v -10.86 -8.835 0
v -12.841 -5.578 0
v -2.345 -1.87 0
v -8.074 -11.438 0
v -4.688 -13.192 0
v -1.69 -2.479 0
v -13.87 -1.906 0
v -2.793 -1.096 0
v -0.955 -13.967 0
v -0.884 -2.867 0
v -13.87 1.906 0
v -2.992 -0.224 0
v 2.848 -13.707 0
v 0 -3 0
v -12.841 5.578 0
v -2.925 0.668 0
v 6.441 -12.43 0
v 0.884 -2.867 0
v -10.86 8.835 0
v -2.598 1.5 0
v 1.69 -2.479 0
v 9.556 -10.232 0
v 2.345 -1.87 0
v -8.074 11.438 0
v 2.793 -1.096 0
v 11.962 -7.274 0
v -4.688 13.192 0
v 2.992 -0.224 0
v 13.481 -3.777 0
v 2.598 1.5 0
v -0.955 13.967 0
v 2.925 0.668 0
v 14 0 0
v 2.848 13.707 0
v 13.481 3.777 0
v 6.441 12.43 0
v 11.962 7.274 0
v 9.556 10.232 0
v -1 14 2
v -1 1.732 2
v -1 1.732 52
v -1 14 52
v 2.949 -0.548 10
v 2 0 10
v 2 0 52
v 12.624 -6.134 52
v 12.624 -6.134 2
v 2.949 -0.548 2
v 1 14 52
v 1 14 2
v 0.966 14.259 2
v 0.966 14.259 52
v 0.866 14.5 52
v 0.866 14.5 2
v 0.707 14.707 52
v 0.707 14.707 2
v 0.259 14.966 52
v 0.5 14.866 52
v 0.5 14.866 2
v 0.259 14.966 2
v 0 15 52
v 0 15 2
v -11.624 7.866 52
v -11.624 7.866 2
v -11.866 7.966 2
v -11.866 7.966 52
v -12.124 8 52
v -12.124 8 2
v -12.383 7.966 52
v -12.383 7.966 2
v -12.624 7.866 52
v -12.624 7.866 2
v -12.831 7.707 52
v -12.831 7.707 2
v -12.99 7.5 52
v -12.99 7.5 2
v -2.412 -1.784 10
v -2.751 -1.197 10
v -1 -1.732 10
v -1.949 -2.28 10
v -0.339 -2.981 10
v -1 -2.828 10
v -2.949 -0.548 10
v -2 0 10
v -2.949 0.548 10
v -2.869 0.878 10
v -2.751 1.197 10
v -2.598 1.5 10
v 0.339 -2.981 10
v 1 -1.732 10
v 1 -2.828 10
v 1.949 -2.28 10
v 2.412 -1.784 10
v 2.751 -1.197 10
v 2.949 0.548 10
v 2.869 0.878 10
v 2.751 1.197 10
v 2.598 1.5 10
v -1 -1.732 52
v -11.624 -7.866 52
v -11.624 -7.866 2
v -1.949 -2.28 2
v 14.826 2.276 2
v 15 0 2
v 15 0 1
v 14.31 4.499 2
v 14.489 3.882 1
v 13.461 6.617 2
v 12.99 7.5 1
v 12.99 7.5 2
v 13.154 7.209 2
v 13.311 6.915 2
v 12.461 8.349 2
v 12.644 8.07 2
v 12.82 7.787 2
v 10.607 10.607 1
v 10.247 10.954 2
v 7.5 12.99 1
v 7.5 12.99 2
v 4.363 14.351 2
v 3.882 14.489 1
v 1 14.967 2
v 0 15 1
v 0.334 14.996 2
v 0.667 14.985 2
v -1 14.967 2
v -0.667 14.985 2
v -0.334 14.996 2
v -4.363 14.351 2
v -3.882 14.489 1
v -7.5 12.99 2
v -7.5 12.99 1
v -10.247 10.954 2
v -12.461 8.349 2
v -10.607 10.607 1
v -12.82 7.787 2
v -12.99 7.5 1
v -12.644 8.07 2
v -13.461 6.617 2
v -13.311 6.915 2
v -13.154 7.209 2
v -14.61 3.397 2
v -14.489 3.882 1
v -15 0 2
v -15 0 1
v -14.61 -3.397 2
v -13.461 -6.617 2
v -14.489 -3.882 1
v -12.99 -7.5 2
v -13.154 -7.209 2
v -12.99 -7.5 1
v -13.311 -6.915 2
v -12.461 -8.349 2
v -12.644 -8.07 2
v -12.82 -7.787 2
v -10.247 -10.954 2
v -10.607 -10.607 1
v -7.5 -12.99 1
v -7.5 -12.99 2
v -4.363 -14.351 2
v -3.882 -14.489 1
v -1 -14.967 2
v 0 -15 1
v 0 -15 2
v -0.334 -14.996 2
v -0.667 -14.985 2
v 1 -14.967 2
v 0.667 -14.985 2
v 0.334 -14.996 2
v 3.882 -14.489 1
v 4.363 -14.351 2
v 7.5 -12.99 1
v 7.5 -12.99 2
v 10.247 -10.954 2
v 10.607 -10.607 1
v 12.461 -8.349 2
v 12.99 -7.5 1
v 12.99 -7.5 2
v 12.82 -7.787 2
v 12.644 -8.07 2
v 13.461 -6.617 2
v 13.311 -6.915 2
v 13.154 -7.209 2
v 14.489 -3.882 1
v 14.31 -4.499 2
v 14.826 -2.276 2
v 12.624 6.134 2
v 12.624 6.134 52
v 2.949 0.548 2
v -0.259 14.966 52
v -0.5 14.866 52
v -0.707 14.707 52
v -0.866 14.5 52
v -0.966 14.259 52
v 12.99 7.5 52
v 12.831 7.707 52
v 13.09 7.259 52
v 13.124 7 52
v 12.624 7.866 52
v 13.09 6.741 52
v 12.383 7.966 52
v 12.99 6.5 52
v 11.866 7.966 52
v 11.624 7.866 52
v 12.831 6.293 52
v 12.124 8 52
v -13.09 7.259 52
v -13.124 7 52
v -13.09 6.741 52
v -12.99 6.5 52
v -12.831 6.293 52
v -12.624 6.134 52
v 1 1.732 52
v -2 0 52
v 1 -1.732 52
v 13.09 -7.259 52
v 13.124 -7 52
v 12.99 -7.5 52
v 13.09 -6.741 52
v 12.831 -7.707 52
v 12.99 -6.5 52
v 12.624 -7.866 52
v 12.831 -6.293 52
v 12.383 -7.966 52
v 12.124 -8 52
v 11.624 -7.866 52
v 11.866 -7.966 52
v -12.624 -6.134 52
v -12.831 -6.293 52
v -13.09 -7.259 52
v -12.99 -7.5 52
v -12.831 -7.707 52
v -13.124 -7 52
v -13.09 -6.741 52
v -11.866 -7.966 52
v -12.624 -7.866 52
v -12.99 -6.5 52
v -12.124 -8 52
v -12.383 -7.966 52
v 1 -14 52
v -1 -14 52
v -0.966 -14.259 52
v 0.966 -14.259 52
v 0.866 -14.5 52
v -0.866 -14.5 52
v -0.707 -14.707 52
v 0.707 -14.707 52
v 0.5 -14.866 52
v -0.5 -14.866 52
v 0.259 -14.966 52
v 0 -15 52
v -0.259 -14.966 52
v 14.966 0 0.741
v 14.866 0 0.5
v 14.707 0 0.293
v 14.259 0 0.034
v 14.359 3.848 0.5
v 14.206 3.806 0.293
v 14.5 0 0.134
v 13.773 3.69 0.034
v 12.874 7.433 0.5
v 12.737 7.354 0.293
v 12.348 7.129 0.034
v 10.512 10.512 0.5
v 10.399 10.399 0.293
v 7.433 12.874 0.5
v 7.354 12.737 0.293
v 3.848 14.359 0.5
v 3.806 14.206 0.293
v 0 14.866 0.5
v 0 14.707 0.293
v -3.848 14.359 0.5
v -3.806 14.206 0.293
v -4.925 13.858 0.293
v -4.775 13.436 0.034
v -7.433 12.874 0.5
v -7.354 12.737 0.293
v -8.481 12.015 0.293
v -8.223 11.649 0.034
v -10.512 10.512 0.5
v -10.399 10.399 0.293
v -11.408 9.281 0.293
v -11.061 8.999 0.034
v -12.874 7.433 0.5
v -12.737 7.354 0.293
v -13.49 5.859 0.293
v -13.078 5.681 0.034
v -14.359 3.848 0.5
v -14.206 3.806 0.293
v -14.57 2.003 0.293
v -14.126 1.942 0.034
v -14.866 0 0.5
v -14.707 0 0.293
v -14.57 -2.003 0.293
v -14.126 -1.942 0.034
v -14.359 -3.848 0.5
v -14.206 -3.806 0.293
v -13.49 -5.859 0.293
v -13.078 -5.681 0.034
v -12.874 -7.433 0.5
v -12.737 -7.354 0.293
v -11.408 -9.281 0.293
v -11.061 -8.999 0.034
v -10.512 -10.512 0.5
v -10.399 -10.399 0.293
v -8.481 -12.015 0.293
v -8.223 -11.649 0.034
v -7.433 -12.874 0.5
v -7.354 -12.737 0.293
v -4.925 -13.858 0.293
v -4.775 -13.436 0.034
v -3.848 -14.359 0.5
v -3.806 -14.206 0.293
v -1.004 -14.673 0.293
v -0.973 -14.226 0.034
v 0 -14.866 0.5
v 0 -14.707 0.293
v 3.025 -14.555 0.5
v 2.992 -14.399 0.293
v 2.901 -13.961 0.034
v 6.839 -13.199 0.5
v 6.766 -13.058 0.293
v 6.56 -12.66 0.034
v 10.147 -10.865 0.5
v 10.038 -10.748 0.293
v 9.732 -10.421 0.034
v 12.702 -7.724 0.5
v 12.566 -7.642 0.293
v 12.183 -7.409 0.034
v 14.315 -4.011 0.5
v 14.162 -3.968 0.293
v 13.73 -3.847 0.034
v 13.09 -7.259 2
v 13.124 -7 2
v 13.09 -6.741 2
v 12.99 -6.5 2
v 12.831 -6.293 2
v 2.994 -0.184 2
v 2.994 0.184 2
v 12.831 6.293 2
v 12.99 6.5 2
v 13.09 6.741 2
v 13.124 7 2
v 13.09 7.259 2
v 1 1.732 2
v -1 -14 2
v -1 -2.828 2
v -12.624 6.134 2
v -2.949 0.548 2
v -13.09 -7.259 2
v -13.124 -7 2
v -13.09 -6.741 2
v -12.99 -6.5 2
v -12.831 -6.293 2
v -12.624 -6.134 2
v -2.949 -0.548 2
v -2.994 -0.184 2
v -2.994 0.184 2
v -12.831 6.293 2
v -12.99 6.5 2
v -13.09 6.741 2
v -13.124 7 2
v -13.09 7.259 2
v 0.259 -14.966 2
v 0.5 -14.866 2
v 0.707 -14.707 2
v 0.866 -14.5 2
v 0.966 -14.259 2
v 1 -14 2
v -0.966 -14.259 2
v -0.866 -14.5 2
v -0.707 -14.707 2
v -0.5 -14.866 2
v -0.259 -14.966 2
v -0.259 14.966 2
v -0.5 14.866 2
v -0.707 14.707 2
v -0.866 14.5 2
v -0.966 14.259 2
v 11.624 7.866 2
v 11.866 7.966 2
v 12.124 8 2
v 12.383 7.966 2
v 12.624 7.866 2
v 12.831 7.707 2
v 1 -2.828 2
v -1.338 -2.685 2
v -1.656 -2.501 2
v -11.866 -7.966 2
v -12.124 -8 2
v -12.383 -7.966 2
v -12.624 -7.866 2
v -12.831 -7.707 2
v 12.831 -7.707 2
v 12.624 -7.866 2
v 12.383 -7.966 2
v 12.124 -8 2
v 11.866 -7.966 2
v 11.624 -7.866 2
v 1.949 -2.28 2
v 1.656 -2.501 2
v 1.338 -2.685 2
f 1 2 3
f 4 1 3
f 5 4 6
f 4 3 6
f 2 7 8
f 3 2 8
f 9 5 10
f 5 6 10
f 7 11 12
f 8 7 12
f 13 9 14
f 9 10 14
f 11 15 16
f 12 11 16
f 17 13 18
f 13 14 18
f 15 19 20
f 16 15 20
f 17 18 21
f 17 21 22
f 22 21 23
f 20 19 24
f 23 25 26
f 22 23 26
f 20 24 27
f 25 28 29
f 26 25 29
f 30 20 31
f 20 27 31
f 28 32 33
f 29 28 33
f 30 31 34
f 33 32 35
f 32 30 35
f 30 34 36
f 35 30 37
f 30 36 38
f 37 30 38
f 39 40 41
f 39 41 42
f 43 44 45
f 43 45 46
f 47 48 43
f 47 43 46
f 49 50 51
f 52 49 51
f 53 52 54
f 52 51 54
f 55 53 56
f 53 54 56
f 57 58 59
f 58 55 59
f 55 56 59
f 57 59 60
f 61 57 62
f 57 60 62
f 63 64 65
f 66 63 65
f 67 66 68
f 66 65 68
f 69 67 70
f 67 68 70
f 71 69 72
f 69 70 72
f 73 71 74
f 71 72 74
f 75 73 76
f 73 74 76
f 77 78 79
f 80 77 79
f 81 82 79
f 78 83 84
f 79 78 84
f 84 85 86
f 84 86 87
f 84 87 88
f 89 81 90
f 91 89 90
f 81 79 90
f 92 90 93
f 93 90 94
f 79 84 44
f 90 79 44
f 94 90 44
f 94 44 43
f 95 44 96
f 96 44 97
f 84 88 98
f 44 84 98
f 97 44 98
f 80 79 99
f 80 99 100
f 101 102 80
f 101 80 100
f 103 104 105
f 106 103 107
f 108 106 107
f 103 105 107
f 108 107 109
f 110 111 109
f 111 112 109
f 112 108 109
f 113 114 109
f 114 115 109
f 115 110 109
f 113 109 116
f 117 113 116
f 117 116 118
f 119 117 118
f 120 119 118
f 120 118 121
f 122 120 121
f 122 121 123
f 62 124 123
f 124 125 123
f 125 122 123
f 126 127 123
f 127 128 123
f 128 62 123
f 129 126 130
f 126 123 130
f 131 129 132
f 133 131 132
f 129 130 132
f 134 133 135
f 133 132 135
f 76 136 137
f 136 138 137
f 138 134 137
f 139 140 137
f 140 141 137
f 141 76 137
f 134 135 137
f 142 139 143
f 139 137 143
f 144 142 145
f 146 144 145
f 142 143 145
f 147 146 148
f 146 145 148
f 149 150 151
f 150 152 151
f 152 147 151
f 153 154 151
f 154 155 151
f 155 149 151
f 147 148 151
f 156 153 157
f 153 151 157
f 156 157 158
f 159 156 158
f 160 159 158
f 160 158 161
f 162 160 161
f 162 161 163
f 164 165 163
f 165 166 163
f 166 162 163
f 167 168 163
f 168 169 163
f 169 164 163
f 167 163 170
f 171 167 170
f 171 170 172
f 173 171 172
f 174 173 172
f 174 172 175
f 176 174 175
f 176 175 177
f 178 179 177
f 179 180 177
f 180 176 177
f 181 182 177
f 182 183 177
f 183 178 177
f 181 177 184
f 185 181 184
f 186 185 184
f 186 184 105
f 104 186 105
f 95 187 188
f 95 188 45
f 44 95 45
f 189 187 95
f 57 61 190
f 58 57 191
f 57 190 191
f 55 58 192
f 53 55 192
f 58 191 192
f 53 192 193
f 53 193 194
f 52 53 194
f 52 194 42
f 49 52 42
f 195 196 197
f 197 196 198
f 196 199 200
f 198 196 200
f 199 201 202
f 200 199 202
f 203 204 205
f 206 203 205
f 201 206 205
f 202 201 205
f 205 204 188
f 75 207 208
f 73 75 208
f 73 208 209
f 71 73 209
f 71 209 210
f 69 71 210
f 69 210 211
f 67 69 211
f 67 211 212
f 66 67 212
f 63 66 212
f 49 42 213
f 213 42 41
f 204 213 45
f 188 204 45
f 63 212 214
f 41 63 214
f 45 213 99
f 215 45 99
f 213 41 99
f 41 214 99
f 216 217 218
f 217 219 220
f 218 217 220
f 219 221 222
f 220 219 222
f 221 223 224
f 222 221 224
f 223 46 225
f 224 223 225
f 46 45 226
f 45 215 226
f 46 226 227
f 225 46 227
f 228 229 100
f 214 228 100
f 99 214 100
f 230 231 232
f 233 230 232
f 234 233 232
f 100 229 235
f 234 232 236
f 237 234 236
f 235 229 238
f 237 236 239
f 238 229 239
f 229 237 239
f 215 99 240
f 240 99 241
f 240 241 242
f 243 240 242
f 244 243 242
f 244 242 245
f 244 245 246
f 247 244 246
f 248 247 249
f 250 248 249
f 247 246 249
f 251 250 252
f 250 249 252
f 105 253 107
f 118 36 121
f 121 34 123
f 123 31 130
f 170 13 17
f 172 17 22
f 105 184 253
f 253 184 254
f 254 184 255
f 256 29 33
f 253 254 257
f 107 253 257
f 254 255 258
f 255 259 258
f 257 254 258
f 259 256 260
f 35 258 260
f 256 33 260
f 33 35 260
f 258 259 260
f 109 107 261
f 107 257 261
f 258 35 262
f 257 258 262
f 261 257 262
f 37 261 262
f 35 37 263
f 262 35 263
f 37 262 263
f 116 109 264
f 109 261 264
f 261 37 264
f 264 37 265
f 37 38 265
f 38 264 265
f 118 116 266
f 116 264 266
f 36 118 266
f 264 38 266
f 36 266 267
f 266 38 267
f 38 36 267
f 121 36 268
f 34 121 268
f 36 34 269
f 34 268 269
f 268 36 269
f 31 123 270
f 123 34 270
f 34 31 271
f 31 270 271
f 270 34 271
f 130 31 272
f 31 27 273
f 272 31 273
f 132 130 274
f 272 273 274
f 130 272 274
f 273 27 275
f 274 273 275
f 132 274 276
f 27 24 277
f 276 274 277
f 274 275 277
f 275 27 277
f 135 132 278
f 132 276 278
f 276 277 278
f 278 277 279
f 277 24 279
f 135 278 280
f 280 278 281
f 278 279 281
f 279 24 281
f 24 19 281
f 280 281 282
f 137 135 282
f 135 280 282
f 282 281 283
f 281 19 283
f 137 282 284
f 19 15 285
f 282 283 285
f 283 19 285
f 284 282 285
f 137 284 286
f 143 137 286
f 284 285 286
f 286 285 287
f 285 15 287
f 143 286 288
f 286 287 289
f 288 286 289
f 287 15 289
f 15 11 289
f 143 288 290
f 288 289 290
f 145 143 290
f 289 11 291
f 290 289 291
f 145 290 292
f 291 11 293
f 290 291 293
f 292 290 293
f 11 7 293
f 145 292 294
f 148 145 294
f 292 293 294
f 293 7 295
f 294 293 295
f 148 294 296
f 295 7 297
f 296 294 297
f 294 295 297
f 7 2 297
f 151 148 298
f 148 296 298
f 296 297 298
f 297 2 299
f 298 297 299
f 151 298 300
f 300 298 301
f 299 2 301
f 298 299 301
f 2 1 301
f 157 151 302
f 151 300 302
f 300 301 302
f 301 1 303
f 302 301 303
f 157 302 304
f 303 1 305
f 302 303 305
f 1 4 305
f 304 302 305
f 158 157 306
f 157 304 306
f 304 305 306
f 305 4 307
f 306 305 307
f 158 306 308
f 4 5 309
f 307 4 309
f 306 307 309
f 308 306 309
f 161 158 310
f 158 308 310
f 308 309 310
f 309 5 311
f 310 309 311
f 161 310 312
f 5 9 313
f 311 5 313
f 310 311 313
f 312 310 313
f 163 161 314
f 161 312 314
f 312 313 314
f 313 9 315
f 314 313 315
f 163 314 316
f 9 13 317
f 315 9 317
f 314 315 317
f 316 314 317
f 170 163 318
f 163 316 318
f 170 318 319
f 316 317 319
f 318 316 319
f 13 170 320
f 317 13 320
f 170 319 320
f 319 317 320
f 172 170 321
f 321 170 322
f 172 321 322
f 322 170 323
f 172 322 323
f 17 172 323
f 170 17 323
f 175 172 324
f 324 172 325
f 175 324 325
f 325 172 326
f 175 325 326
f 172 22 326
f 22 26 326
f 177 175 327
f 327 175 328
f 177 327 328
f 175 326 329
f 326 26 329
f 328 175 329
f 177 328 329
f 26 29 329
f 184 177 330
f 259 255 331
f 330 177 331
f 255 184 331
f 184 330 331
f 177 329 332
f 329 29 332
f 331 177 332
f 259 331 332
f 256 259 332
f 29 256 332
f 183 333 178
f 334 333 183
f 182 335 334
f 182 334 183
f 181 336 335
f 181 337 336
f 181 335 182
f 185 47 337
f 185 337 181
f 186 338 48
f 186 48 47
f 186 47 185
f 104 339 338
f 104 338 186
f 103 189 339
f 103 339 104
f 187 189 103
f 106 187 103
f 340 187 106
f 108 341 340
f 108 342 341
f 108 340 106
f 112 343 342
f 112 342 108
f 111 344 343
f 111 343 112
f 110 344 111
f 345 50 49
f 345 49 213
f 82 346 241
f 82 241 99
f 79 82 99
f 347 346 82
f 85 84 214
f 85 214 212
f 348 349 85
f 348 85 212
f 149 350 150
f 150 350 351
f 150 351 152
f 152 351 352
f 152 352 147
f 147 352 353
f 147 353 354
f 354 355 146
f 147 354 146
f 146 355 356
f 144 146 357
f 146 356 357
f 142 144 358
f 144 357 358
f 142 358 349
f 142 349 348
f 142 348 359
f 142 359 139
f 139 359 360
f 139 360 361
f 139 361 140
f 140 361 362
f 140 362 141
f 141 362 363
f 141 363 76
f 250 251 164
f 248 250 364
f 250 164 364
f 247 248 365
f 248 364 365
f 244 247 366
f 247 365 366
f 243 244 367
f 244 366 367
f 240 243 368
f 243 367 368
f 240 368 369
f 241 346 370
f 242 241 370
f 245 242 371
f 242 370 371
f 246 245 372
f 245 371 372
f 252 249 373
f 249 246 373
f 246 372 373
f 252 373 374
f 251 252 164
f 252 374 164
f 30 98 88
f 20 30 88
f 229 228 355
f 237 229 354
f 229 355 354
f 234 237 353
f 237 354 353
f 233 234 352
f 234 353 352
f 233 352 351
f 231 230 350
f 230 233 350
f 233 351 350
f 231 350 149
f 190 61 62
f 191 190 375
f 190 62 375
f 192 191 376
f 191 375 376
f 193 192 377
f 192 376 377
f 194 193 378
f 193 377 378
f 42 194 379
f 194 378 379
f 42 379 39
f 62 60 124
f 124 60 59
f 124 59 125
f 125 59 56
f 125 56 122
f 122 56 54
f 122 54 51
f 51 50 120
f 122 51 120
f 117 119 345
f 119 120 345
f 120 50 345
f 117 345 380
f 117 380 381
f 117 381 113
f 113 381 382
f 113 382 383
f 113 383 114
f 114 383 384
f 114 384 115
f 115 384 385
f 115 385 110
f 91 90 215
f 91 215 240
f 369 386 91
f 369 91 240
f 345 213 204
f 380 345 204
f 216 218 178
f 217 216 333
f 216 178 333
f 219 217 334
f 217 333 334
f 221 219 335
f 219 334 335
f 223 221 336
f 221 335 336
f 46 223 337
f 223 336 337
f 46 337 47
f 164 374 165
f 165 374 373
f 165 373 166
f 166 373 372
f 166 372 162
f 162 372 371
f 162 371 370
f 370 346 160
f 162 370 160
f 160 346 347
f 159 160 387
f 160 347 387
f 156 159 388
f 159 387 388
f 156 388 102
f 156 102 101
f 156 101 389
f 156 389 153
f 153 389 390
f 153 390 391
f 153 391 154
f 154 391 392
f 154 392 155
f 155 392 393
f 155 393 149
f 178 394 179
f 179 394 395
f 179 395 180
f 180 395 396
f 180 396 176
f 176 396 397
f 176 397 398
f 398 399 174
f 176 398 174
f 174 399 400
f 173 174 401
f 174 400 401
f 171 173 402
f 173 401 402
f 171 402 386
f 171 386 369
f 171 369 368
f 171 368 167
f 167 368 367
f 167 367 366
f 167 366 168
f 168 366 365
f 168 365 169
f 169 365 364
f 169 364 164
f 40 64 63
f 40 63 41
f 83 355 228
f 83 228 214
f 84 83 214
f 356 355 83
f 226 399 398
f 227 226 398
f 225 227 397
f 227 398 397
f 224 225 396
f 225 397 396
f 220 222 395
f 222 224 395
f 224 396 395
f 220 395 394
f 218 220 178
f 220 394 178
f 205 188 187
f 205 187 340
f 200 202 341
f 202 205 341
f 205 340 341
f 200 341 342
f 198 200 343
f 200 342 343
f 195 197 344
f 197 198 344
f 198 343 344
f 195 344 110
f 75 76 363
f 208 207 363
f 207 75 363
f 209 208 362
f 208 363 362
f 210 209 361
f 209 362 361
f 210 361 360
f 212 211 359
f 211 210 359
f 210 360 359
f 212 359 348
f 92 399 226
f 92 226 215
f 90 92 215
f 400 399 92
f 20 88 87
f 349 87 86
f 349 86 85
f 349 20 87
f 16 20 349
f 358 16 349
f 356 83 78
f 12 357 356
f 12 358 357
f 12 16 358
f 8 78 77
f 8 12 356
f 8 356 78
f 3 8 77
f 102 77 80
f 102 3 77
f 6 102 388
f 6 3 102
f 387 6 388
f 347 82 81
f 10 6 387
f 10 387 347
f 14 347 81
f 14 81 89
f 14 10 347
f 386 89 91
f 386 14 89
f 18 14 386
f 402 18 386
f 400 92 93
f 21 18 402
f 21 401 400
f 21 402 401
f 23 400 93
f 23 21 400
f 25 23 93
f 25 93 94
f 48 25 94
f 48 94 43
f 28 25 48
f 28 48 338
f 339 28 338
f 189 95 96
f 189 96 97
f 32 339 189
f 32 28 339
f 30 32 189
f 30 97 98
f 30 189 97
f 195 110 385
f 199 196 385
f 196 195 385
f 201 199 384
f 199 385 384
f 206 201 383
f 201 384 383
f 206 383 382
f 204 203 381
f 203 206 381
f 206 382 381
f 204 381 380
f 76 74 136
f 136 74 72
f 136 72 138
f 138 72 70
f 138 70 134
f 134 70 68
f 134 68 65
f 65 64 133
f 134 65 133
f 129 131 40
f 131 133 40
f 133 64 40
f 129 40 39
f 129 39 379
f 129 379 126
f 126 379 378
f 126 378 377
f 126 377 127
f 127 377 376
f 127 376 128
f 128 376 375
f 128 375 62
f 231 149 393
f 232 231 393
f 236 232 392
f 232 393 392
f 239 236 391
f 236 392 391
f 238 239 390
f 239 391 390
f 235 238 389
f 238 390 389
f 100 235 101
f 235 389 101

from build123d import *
from build123d.topology import SkipClean

# Parameters (mm, degrees)
SKETCH1_R           = 15
BOSS_EXTRUDE1_DEPTH = 2
BOSS_EXTRUDE2_DEPTH = 50
CIRPATTERN1_COUNT   = 3
CIRPATTERN1_ANGLE   = 120
CUT_EXTRUDE1_DEPTH  = 10
FILLET2_R           = 1
FILLET3_R           = 1


with BuildPart() as part:
    # Sketch1 → Boss-Extrude1 (new body)
    with BuildSketch(Plane.XY):
        Circle(SKETCH1_R)
    extrude(amount=BOSS_EXTRUDE1_DEPTH)

    # Sketch2 → Boss-Extrude2 (add)
    with SkipClean():  # the faces are left unmerged after this step: merging them gives an invalid solid
        with BuildSketch(Plane.XY.offset(2)):
            with BuildLine():
                Line((-1, -14.966629547), (-1, 14.966629547))
                ThreePointArc((-1, 14.966629547), (0, 15), (1, 14.966629547))
                Line((1, 14.966629547), (1, -14.966629547))
                ThreePointArc((1, -14.966629547), (0, -15), (-1, -14.966629547))
            make_face()
        boss_extrude2 = extrude(amount=BOSS_EXTRUDE2_DEPTH)

    # CirPattern1: Boss-Extrude2 ×3 about axis
    with SkipClean():  # the faces are left unmerged after this step: merging them gives an invalid solid
        cirpattern1_axis = Axis((0, 0, 0), (0, 0, 1))
        for i in range(1, CIRPATTERN1_COUNT):
            add(boss_extrude2.rotate(cirpattern1_axis, i * CIRPATTERN1_ANGLE / (CIRPATTERN1_COUNT - 1)))

    # Sketch3 → Cut-Extrude1 (cut)
    with SkipClean():  # the faces are left unmerged after this step: merging them gives an invalid solid
        with BuildSketch(Plane(origin=(0, 0, 0), x_dir=(-1, 0, 0), z_dir=(0, 0, -1))):
            with BuildLine():
                Line((-2.598076211, 1.5), (2.598076211, 1.5))
                ThreePointArc((2.598076211, 1.5), (0, -3), (-2.598076211, 1.5))
            make_face()
        extrude(amount=-CUT_EXTRUDE1_DEPTH, mode=Mode.SUBTRACT)

    # Fillet2
    # the kernel refuses this fillet: 1 mm, written as the material it takes off along each edge
    with BuildSketch(Plane(origin=(12.461481397, 8.349340177, 2), x_dir=(0.5286054177499072, -0.8488676647896573, 0), z_dir=(0, 0, 1)), Plane(origin=(-12.461481397, -8.349340177, 2), x_dir=(-0.5286054177499102, 0.8488676647896556, 0), z_dir=(0, 0, 1)), Plane(origin=(-13.461481397, 6.61728937, 2), x_dir=(0.4708382532840629, 0.882219552744334, 0), z_dir=(0, 0, 1)), Plane(origin=(13.461481397, -6.61728937, 2), x_dir=(-0.47083825328406437, -0.8822195527443331, 0), z_dir=(0, 0, 1)), Plane(origin=(-1, 14.966629547, 2), x_dir=(0.9994436710339702, 0.03335188795467453, 0), z_dir=(0, 0, 1)), Plane(origin=(1, -14.966629547, 2), x_dir=(-0.9994436710339702, -0.03335188795467453, 0), z_dir=(0, 0, 1))) as fillet2_piece_1:
        with BuildLine():
            CenterArc((0.967204751, -0.999443671), FILLET2_R, 88.088723135, 90)
            Line((-0.03223892, -0.966091783), (0, 0))
            ThreePointArc((0, 0), (0.500278319, 0.008344934), (1.000556639, 0))
        make_face()
    extrude(amount=52.501391597, mode=Mode.SUBTRACT)
    with BuildSketch(Plane(origin=(-12.461481397, 8.349340177, 2), x_dir=(-0.5286054177498939, -0.8488676647896658, 0), z_dir=(0, 0, 1)), Plane(origin=(12.461481397, -8.349340177, 2), x_dir=(0.52860541774991, 0.8488676647896555, 0), z_dir=(0, 0, 1)), Plane(origin=(13.461481397, 6.61728937, 2), x_dir=(-0.4708382532840634, 0.8822195527443337, 0), z_dir=(0, 0, 1)), Plane(origin=(-13.461481397, -6.61728937, 2), x_dir=(0.470838253284063, -0.8822195527443338, 0), z_dir=(0, 0, 1)), Plane(origin=(1, 14.966629547, 2), x_dir=(-0.9994436710339702, 0.03335188795467452, 0), z_dir=(0, 0, 1)), Plane(origin=(-1, -14.966629547, 2), x_dir=(0.9994436710339702, -0.03335188795467453, 0), z_dir=(0, 0, 1))) as fillet2_piece_2:
        with BuildLine():
            CenterArc((0.967204751, 0.999443671), FILLET2_R, 181.911276865, 90)
            Line((-0.03223892, 0.966091783), (0, 0))
            ThreePointArc((0, 0), (0.500278319, -0.008344934), (1.000556639, 0))
        make_face()
    extrude(amount=52.501391597, mode=Mode.SUBTRACT)

    # Fillet3
    fillet3_edges = [part.edges().sort_by_distance(p)[0] for p in [
        (-15, 0, 0),
    ]]
    fillet(fillet3_edges, radius=FILLET3_R)


solid = part.part
